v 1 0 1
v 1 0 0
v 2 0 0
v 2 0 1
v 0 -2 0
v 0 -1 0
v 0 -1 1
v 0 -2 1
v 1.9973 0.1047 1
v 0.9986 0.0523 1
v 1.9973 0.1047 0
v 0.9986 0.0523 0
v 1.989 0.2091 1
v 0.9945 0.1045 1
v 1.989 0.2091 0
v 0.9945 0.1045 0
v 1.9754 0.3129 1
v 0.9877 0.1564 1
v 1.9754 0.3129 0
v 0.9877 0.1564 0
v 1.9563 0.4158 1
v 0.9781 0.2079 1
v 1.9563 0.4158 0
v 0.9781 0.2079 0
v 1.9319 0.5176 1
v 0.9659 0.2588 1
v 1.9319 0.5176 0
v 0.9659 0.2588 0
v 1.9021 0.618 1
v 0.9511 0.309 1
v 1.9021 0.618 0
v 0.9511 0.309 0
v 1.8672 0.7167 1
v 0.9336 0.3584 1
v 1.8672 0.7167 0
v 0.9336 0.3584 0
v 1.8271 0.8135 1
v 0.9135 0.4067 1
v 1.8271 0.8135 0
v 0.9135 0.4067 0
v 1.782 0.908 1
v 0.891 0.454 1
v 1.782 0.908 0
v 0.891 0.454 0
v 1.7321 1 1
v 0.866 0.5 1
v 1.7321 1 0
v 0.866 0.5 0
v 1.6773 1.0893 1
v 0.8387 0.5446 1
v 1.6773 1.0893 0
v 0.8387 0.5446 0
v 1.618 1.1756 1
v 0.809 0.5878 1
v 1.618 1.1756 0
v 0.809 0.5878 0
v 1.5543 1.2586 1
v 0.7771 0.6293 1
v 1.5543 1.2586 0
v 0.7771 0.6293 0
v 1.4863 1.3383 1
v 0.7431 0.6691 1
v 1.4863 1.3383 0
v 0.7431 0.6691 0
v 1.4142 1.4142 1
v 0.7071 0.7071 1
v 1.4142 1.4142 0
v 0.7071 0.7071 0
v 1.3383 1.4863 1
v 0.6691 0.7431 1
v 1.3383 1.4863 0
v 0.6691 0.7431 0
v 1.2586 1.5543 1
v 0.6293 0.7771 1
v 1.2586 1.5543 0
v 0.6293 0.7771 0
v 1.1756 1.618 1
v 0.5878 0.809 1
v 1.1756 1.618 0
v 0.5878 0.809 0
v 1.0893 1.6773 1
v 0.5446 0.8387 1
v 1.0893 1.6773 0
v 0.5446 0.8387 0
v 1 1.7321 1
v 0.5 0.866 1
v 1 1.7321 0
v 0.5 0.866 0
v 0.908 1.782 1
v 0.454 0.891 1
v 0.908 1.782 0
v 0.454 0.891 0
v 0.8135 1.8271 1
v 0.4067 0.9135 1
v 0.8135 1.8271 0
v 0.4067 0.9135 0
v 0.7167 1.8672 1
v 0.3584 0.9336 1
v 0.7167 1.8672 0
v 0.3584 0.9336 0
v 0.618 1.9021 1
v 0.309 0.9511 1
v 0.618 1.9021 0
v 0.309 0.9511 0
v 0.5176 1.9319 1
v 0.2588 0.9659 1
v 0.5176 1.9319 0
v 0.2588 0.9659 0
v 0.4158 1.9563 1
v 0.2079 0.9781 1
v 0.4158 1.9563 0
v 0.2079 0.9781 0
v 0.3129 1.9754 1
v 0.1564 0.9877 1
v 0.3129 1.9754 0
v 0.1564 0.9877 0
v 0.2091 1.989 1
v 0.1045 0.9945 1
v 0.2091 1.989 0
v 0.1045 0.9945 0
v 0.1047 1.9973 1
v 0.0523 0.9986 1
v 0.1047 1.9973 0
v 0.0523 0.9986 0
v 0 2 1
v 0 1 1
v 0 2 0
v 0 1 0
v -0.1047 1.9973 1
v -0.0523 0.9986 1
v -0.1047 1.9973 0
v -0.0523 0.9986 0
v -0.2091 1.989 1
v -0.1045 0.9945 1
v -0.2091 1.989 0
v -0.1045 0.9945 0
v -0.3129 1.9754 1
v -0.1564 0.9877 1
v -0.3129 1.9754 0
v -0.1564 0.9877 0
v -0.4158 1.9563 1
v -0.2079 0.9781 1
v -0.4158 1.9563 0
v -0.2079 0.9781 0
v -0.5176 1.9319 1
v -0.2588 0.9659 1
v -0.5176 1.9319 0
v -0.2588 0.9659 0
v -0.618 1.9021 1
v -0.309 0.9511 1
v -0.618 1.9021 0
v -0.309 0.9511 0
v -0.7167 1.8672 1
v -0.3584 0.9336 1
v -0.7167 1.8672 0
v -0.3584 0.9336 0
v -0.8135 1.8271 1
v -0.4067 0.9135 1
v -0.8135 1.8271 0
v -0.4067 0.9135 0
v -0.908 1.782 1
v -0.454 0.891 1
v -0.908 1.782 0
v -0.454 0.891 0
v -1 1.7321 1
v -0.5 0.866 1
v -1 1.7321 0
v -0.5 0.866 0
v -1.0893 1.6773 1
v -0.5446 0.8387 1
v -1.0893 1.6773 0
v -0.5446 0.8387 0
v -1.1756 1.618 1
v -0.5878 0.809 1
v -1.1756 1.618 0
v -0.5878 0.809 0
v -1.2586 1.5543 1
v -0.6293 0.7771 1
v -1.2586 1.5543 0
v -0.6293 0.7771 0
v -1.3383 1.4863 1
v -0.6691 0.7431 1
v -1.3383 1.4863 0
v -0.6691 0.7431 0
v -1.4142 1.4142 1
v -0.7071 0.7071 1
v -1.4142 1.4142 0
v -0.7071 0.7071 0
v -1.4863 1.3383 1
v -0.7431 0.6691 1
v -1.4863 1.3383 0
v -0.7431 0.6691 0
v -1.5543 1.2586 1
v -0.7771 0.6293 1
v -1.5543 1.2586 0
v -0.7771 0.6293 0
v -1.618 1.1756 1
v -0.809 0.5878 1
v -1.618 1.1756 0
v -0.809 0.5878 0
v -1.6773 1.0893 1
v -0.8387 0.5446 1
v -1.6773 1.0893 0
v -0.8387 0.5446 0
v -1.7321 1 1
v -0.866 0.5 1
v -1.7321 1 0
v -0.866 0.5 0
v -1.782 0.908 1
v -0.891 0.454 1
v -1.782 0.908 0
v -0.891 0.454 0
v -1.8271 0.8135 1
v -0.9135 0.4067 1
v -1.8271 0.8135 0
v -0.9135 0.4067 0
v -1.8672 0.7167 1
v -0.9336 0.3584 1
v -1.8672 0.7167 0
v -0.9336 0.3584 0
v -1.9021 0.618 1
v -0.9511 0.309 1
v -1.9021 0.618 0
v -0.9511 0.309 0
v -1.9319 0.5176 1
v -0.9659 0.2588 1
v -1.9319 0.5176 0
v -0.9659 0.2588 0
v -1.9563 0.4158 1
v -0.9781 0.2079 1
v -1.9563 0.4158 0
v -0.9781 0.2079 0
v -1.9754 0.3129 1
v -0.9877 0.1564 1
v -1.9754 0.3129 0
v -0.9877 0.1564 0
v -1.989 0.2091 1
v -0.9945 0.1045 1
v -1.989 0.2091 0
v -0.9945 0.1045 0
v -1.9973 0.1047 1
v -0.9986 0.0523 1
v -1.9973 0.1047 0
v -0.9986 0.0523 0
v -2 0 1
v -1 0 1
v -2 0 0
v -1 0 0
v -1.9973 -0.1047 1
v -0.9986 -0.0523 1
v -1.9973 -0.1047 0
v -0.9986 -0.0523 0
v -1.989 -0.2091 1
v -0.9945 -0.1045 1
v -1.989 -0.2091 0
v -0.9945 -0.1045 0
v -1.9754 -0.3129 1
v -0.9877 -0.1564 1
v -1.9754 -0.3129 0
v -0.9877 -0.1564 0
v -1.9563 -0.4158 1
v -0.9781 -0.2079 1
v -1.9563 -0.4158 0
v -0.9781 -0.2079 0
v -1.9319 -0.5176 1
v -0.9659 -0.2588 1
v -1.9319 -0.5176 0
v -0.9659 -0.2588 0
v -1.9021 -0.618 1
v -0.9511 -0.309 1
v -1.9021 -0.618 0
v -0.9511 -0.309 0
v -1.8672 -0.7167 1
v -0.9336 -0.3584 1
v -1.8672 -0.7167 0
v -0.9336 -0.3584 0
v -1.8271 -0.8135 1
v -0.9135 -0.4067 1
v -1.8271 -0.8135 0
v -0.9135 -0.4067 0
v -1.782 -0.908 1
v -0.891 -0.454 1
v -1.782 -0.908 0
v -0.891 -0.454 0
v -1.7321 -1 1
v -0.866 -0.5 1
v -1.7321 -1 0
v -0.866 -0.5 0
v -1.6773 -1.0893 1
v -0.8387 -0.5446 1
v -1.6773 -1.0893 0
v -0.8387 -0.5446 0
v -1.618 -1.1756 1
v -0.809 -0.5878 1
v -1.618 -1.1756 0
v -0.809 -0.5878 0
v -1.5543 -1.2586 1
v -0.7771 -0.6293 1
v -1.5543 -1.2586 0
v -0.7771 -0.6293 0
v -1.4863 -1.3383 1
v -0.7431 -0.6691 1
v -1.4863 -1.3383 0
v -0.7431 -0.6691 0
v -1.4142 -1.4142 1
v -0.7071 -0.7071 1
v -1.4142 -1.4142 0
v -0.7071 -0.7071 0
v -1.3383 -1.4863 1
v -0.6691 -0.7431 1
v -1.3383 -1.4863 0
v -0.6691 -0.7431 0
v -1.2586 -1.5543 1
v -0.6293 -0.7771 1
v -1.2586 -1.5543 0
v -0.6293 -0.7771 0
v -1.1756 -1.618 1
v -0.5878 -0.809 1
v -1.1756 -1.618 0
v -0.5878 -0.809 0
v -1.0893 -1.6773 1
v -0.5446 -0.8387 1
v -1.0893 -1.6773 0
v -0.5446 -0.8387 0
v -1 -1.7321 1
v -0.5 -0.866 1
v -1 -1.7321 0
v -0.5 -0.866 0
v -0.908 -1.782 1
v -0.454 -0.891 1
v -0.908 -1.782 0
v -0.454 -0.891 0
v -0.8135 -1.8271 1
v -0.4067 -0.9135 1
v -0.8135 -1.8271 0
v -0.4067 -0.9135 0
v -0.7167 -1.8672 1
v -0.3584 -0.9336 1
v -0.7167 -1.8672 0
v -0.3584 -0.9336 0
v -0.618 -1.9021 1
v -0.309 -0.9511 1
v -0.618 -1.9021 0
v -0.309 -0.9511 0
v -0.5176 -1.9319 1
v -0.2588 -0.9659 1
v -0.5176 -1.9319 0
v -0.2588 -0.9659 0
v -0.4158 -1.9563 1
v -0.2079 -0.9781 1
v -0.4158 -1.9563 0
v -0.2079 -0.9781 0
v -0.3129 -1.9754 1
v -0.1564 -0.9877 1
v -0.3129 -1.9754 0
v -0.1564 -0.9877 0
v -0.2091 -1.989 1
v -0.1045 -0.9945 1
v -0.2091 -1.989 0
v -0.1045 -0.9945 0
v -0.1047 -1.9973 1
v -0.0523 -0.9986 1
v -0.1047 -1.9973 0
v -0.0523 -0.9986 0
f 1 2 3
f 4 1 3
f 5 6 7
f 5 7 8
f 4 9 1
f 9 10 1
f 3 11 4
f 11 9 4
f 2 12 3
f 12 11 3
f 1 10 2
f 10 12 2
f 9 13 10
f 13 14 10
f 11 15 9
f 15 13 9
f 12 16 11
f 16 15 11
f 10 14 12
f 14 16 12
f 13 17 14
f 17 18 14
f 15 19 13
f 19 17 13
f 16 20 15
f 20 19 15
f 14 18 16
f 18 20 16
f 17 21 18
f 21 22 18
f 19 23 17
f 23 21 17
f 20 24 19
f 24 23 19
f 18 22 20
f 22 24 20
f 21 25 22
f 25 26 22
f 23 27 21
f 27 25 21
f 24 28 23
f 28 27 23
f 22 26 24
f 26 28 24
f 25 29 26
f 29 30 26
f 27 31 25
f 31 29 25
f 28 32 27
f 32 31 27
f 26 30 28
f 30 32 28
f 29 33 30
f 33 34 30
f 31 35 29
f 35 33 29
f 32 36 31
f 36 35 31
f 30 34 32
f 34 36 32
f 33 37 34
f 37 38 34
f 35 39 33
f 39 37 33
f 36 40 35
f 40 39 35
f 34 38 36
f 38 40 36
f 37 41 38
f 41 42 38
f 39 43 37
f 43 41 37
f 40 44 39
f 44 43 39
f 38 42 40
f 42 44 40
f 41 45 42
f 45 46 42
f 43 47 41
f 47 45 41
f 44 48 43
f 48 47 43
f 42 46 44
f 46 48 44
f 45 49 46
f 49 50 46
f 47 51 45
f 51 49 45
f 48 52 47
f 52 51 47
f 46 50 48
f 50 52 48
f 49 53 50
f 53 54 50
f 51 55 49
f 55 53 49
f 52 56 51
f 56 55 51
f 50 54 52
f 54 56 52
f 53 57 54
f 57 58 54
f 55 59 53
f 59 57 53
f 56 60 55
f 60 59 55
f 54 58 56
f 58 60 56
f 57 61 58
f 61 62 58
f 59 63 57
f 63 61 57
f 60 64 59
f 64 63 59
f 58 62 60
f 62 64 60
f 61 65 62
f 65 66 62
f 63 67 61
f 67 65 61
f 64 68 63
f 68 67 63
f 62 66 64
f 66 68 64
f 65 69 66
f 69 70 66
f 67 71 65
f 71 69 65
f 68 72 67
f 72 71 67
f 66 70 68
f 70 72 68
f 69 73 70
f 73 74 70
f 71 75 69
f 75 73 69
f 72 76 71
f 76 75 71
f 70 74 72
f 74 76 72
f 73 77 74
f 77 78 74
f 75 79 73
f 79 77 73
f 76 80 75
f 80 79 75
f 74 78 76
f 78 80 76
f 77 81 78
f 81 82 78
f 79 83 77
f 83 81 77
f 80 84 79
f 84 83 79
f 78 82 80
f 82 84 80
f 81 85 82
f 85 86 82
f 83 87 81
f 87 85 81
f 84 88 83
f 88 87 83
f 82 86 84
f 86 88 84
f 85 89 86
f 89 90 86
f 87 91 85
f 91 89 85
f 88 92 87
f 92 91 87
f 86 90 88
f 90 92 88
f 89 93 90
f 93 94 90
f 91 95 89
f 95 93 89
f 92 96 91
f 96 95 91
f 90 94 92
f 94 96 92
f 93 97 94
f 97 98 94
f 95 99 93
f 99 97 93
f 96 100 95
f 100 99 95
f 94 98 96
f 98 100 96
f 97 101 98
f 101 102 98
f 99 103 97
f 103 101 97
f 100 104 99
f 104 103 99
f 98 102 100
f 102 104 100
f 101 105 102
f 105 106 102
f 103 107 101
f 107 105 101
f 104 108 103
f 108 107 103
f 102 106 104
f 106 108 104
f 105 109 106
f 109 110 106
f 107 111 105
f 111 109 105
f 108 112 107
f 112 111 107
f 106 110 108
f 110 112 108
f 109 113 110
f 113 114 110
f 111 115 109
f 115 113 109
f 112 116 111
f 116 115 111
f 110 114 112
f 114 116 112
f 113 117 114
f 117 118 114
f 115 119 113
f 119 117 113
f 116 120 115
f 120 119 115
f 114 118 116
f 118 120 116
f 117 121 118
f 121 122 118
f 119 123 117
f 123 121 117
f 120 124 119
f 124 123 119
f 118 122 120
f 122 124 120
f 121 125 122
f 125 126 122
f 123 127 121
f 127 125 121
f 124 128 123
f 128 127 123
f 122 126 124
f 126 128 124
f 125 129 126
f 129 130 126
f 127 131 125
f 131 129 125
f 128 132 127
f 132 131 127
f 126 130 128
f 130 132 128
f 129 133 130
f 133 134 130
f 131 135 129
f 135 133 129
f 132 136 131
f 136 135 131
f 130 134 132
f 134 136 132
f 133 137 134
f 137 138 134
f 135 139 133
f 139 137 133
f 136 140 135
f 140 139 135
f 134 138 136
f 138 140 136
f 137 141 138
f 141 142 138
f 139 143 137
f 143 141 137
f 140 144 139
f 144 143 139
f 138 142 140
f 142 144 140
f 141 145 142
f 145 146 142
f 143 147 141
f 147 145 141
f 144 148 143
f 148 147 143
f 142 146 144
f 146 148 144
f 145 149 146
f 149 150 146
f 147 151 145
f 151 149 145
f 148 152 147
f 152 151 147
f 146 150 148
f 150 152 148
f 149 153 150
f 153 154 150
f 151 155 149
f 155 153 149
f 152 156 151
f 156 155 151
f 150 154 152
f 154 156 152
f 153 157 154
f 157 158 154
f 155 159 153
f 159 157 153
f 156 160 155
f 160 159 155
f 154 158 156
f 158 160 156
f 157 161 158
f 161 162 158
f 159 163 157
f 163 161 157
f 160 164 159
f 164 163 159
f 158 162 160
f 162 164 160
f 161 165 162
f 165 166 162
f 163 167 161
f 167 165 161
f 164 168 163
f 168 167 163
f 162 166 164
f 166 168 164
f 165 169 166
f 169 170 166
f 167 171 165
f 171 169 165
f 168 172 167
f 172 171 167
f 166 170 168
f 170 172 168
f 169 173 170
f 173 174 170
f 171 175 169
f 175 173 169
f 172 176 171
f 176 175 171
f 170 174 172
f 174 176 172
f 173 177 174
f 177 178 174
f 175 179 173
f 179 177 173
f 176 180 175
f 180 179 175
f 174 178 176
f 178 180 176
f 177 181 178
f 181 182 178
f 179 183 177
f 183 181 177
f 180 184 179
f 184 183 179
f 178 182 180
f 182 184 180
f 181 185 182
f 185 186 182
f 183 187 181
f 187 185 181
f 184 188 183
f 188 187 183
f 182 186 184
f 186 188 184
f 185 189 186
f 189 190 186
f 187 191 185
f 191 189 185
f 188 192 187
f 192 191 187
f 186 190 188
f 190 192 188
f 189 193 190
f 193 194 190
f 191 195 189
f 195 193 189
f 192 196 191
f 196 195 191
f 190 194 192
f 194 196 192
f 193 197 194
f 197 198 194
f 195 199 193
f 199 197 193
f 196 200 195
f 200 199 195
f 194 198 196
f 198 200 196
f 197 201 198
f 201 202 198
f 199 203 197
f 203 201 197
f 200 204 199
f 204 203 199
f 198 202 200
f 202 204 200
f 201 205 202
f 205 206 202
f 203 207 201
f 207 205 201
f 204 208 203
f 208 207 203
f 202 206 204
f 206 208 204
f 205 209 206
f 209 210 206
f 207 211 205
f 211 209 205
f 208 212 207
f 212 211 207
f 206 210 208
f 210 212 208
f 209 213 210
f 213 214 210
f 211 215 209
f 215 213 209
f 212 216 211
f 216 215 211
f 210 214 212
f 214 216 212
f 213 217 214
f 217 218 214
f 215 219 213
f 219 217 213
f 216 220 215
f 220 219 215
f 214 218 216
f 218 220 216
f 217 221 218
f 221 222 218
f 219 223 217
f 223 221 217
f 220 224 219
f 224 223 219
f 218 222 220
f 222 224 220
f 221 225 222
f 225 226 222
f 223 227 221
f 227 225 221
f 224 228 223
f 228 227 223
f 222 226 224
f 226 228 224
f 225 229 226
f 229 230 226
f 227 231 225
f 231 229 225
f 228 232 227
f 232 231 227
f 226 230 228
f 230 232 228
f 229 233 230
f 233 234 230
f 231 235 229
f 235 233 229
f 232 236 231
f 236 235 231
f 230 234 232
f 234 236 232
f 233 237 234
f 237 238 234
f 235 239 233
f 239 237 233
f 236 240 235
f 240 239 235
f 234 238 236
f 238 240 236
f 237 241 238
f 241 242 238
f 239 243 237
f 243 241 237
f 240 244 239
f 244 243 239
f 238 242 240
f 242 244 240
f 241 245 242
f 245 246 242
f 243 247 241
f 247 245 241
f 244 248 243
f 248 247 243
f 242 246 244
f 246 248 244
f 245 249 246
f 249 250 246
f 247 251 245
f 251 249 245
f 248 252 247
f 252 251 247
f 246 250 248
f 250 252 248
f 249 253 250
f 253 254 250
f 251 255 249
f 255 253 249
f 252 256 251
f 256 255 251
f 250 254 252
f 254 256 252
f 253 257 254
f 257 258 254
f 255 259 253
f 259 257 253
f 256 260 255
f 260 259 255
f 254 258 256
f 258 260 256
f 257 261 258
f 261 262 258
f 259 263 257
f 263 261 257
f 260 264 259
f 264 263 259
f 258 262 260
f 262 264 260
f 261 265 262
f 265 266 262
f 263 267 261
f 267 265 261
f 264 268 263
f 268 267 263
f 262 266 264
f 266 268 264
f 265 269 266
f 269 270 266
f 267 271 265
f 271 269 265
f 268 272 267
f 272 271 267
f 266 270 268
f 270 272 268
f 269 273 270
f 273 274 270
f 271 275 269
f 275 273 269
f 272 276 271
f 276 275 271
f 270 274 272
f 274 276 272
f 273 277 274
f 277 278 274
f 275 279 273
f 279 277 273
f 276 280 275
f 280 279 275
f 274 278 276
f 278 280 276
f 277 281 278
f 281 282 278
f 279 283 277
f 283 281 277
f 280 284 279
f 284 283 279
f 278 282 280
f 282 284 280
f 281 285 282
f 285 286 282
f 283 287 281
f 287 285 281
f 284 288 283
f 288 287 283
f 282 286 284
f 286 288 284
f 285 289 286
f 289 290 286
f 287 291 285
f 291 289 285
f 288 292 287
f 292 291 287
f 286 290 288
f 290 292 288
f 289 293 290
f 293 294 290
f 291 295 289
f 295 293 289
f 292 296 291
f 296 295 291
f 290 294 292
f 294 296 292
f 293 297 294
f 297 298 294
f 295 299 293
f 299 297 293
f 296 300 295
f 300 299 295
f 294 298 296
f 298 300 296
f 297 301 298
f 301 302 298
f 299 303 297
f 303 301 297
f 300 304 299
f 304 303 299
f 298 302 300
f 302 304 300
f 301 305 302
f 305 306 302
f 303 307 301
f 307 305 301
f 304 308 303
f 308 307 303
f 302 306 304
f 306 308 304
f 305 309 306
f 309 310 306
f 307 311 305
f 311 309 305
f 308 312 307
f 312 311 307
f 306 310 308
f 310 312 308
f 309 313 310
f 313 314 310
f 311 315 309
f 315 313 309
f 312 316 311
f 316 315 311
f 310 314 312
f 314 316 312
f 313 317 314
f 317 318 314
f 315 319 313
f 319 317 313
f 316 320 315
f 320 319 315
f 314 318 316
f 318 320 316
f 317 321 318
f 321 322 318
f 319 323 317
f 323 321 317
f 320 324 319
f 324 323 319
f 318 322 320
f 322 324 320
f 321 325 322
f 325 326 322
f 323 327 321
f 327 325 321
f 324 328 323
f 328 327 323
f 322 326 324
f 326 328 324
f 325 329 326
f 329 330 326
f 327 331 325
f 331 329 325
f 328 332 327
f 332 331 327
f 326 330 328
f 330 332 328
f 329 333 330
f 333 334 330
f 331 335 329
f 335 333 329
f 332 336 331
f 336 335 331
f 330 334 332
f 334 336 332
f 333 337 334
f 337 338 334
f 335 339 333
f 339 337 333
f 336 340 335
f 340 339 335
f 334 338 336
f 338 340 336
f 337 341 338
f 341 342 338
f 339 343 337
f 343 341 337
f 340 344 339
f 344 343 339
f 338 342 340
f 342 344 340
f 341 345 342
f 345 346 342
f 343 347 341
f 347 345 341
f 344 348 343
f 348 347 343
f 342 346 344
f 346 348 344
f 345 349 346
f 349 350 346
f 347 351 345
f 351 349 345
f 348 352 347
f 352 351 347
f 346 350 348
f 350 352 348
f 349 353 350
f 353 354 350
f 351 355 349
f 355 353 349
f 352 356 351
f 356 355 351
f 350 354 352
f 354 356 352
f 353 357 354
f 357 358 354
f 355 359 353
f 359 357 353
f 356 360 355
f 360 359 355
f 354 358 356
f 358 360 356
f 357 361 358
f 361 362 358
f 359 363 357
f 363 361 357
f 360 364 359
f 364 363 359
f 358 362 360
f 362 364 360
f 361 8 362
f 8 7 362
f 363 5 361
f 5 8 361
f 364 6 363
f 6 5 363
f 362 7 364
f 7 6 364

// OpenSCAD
//------------------------------------------------------------------------------------------
// THIS CODE WAS GENERATED WITH GRAPHSCAD
//------------------------------------------------------------------------------------------
// F:/workspace/graphscad/graphscadfiles/rotateextrude.scad
//------------------------------------------------------------------------------------------
// Graphscad is a graphical nodal editor to create .SCAD files
//
// More info here : http://graphscad.free.fr
//
// Scad Files created with Graphscad can be edited by graphscad
// Scad Files created with Graphscad can be read by Openscad
//
//------------------------------------------------------------------------------------------
module rotateextrude()
{
 function node_square_matrix(i=0,j=0,k=0,l=0,m=0,n=0) = translate([1,0,0]);
 module node_square(i=0,j=0,k=0,l=0,m=0,n=0)
 {
  translate([1,0,0])square(size=[1,1],center=false);
 }
 function node_rotateextrude_matrix(i=0,j=0,k=0,l=0,m=0,n=0) = translate([0,0,0]);
 module node_rotateextrude(i=0,j=0,k=0,l=0,m=0,n=0)
 {
  rotate_extrude(angle=270,convexity=3,$fn=120)
  {
   node_square(i,j,k,l,m,n);
  }
 }
 node_rotateextrude();
 /*--------------------------------------------------------------------------------------------------------
  Graphscad Utils functions
  This code is Used By Graphscad Nodal Editor to generate SCAD files
 --------------------------------------------------------------------------------------------------------*/
 function det4x4(a) =
 a[0][0]*a[1][1]*a[2][2]*a[3][3] + a[0][0]*a[1][2]*a[2][3]*a[3][1] + a[0][0]*a[1][3]*a[2][1]*a[3][2]
 + a[0][1]*a[1][0]*a[2][3]*a[3][2] + a[0][1]*a[1][2]*a[2][0]*a[3][3] + a[0][1]*a[1][3]*a[2][2]*a[3][0]
 + a[0][2]*a[1][0]*a[2][1]*a[3][3] + a[0][2]*a[1][1]*a[2][3]*a[3][0] + a[0][2]*a[1][3]*a[2][0]*a[3][1]
 + a[0][3]*a[1][0]*a[2][2]*a[3][1] + a[0][3]*a[1][1]*a[2][0]*a[3][2] + a[0][3]*a[1][2]*a[2][1]*a[3][0]
 - a[0][0]*a[1][1]*a[2][3]*a[3][2] - a[0][0]*a[1][2]*a[2][1]*a[3][3] - a[0][0]*a[1][3]*a[2][2]*a[3][1]
 - a[0][1]*a[1][0]*a[2][2]*a[3][3] - a[0][1]*a[1][2]*a[2][3]*a[3][0] - a[0][1]*a[1][3]*a[2][0]*a[3][2]
 - a[0][2]*a[1][0]*a[2][3]*a[3][1] - a[0][2]*a[1][1]*a[2][0]*a[3][3] - a[0][2]*a[1][3]*a[2][1]*a[3][0]
 - a[0][3]*a[1][0]*a[2][1]*a[3][2] - a[0][3]*a[1][1]*a[2][2]*a[3][0] - a[0][3]*a[1][2]*a[2][0]*a[3][1];
 function invb00(a) = a[1][1]*a[2][2]*a[3][3] + a[1][2]*a[2][3]*a[3][1] + a[1][3]*a[2][1]*a[3][2] - a[1][1]*a[2][3]*a[3][2] - a[1][2]*a[2][1]*a[3][3] - a[1][3]*a[2][2]*a[3][1];
 function invb01(a) = a[0][1]*a[2][3]*a[3][2] + a[0][2]*a[2][1]*a[3][3] + a[0][3]*a[2][2]*a[3][1] - a[0][1]*a[2][2]*a[3][3] - a[0][2]*a[2][3]*a[3][1] - a[0][3]*a[2][1]*a[3][2];
 function invb02(a) = a[0][1]*a[1][2]*a[3][3] + a[0][2]*a[1][3]*a[3][1] + a[0][3]*a[1][1]*a[3][2] - a[0][1]*a[1][3]*a[3][2] - a[0][2]*a[1][1]*a[3][3] - a[0][3]*a[1][2]*a[3][1];
 function invb03(a) = a[0][1]*a[1][3]*a[2][2] + a[0][2]*a[1][1]*a[2][3] + a[0][3]*a[1][2]*a[2][1] - a[0][1]*a[1][2]*a[2][3] - a[0][2]*a[1][3]*a[2][1] - a[0][3]*a[1][1]*a[2][2];
 function invb10(a) = a[1][0]*a[2][3]*a[3][2] + a[1][2]*a[2][0]*a[3][3] + a[1][3]*a[2][2]*a[3][0] - a[1][0]*a[2][2]*a[3][3] - a[1][2]*a[2][3]*a[3][0] - a[1][3]*a[2][0]*a[3][2];
 function invb11(a) = a[0][0]*a[2][2]*a[3][3] + a[0][2]*a[2][3]*a[3][0] + a[0][3]*a[2][0]*a[3][2] - a[0][0]*a[2][3]*a[3][2] - a[0][2]*a[2][0]*a[3][3] - a[0][3]*a[2][2]*a[3][0];
 function invb12(a) = a[0][0]*a[1][3]*a[3][2] + a[0][2]*a[1][0]*a[3][3] + a[0][3]*a[1][2]*a[3][0] - a[0][0]*a[1][2]*a[3][3] - a[0][2]*a[1][3]*a[3][0] - a[0][3]*a[1][0]*a[3][2];
 function invb13(a) = a[0][0]*a[1][2]*a[2][3] + a[0][2]*a[1][3]*a[2][0] + a[0][3]*a[1][0]*a[2][2] - a[0][0]*a[1][3]*a[2][2] - a[0][2]*a[1][0]*a[2][3] - a[0][3]*a[1][2]*a[2][0];
 function invb20(a) = a[1][0]*a[2][1]*a[3][3] + a[1][1]*a[2][3]*a[3][0] + a[1][3]*a[2][0]*a[3][1] - a[1][0]*a[2][3]*a[3][1] - a[1][1]*a[2][0]*a[3][3] - a[1][3]*a[2][1]*a[3][0];
 function invb21(a) = a[0][0]*a[2][3]*a[3][1] + a[0][1]*a[2][0]*a[3][3] + a[0][3]*a[2][1]*a[3][0] - a[0][0]*a[2][1]*a[3][3] - a[0][1]*a[2][3]*a[3][0] - a[0][3]*a[2][0]*a[3][1];
 function invb22(a) = a[0][0]*a[1][1]*a[3][3] + a[0][1]*a[1][3]*a[3][0] + a[0][3]*a[1][0]*a[3][1] - a[0][0]*a[1][3]*a[3][1] - a[0][1]*a[1][0]*a[3][3] - a[0][3]*a[1][1]*a[3][0];
 function invb23(a) = a[0][0]*a[1][3]*a[2][1] + a[0][1]*a[1][0]*a[2][3] + a[0][3]*a[1][1]*a[2][0] - a[0][0]*a[1][1]*a[2][3] - a[0][1]*a[1][3]*a[2][0] - a[0][3]*a[1][0]*a[2][1];
 function invb30(a) = a[1][0]*a[2][2]*a[3][1] + a[1][1]*a[2][0]*a[3][2] + a[1][2]*a[2][1]*a[3][0] - a[1][0]*a[2][1]*a[3][2] - a[1][1]*a[2][2]*a[3][0] - a[1][2]*a[2][0]*a[3][1];
 function invb31(a) = a[0][0]*a[2][1]*a[3][2] + a[0][1]*a[2][2]*a[3][0] + a[0][2]*a[2][0]*a[3][1] - a[0][0]*a[2][2]*a[3][1] - a[0][1]*a[2][0]*a[3][2] - a[0][2]*a[2][1]*a[3][0];
 function invb32(a) = a[0][0]*a[1][2]*a[3][1] + a[0][1]*a[1][0]*a[3][2] + a[0][2]*a[1][1]*a[3][0] - a[0][0]*a[1][1]*a[3][2] - a[0][1]*a[1][2]*a[3][0] - a[0][2]*a[1][0]*a[3][1];
 function invb33(a) = a[0][0]*a[1][1]*a[2][2] + a[0][1]*a[1][2]*a[2][0] + a[0][2]*a[1][0]*a[2][1] - a[0][0]*a[1][2]*a[2][1] - a[0][1]*a[1][0]*a[2][2] - a[0][2]*a[1][1]*a[2][0];
 function inv4x4(a)= (1/det4x4(a))*[
 [invb00(a),invb01(a),invb02(a),invb03(a)],
 [invb10(a),invb11(a),invb12(a),invb13(a)],
 [invb20(a),invb21(a),invb22(a),invb23(a)],
 [invb30(a),invb31(a),invb32(a),invb33(a)]];
 function onlytranslate(a)=  [
                        [1,0,0,a[0][3]],
                        [0,1,0,a[1][3]],
                        [0,0,1,a[2][3]],
                        [0,0,0,1]];
 function negonlytranslate(a)=[
                        [1,0,0,-a[0][3]],
                        [0,1,0,-a[1][3]],
                        [0,0,1,-a[2][3]],
                        [0,0,0,1]];
 function lookatvec(t,parentmat) = [t[0]-parentmat[0][3],
                                 t[1]-parentmat[1][3],
                                 t[2]-parentmat[2][3]];
 /*
              rx = '0'
              ry = 'acos('+tz+'/norm(['+tx+','+ty+','+tz+']))'
              rz = 'atan2('+ty+','+tx+')'
 */
 function lookatrot(t,parentmat) = [0,
                                 acos((t[2]-parentmat[2][3])/norm(lookatvec(t,parentmat))),
                                 atan2(t[1]-parentmat[1][3],t[0]-parentmat[0][3])];
 function gettranslation(m) = [m[0][3],m[1][3],m[2][3]];
 function vectormulmatrix(v,m) = m*v;
 function vectorlength(v) = norm(v);
 function vectorx(v) = v[0];
 function vectory(v) = v[1];
 function vectorz(v) = v[2];
 function vectoradd(a,b) = (a+b);
 function vectorsub(a,b) = (a-b);
 function vectormul(a,b) = (a*b);
 function vectordiv(a,b) = (a*(1/b));
 function scale(v)=[[v[0],0,0,0],
                    [0,v[1],0,0],
                    [0,0,v[2],0],
                    [0,0,0,1]];
 function rotatex(a)=[[1,0,0,0],
                      [0,cos(a),-sin(a),0],
                      [0,sin(a),cos(a),0],
                      [0,0,0,1]];
 function rotatey(a)=[[cos(a),0,sin(a),0],
                      [0,1,0,0],
                      [-sin(a),0,cos(a),0],
                      [0,0,0,1]];
 function rotatez(a)=[[cos(a),-sin(a),0,0],
                      [sin(a),cos(a),0,0],
                      [0,0,1,0],
                      [0,0,0,1]];
 function rotatea(c,s,l,m,n)=[[l*l*(1-c)+c,m*l*(1-c)-n*s,n*l*(1-c)+m*s,0],
                              [l*m*(1-c)+n*s,m*m*(1-c)+c,n*m*(1-c)-l*s,0],
                              [l*n*(1-c)-m*s,m*n*(1-c)+l*s,n*n*(1-c)+c,0],
                              [0,0,0,1]];
 function rotateanv(a,nv)=rotatea(cos(a),sin(a),nv[0],nv[1],nv[2]);
 function rotate(a,v, normV=true)=(v==undef)?rotatez(a[2])*rotatey(a[1])*rotatex(a[0]):
                      normV ? rotateanv(a,v/sqrt(v*v)) : rotateanv(a,v);
 function translate(v)=[[1,0,0,v[0]],
                        [0,1,0,v[1]],
                        [0,0,1,v[2]],
                        [0,0,0,1]];
 function mirrorabc(a,b,c)=[[1-2*a*a,-2*a*b,-2*a*c,0],
                            [-2*a*b,1-2*b*b,-2*b*c,0],
                            [-2*a*c,-2*b*c,1-2*c*c,0],
                            [0,0,0,1]];
 function mirrornv(nv)=mirrorabc(nv[0],nv[1],nv[2]);
 function mirror(v)=mirrornv(v/sqrt(v*v));
}
rotateextrude();


/*BEGINGRAPHSCAD{
    "nodes": [
        {
            "name": "node_square",
            "inputplugs": [
                {
                    "type": "str",
                    "name": "x",
                    "value": "1"
                },
                {
                    "type": "str",
                    "name": "y",
                    "value": "1"
                },
                {
                    "type": "str",
                    "name": "tx",
                    "value": "1"
                },
                {
                    "type": "str",
                    "name": "ty",
                    "value": "0"
                },
                {
                    "type": "str",
                    "name": "tz",
                    "value": "0"
                },
                {
                    "type": "str",
                    "name": "center",
                    "value": "false",
                    "combo": [
                        "true",
                        "false"
                    ]
                }
            ],
            "typename": "Node_square",
            "version": 1,
            "y": 71.18358779014685,
            "x": -4325.341933308979
        },
        {
            "name": "node_rotateextrude",
            "inputplugs": [
                {
                    "connection": "node_square.object2d",
                    "type": "object2d",
                    "name": "object2d",
                    "value": ""
                },
                {
                    "type": "str",
                    "name": "angle",
                    "value": "270"
                },
                {
                    "type": "str",
                    "name": "convexity",
                    "value": "3"
                },
                {
                    "type": "str",
                    "name": "$fn",
                    "value": "120"
                }
            ],
            "typename": "Node_rotateextrude",
            "version": 1,
            "y": 75.64535690558907,
            "x": -4087.5368358577034
        }
    ],
    "version": 2
}ENDGRAPHSCAD*/
